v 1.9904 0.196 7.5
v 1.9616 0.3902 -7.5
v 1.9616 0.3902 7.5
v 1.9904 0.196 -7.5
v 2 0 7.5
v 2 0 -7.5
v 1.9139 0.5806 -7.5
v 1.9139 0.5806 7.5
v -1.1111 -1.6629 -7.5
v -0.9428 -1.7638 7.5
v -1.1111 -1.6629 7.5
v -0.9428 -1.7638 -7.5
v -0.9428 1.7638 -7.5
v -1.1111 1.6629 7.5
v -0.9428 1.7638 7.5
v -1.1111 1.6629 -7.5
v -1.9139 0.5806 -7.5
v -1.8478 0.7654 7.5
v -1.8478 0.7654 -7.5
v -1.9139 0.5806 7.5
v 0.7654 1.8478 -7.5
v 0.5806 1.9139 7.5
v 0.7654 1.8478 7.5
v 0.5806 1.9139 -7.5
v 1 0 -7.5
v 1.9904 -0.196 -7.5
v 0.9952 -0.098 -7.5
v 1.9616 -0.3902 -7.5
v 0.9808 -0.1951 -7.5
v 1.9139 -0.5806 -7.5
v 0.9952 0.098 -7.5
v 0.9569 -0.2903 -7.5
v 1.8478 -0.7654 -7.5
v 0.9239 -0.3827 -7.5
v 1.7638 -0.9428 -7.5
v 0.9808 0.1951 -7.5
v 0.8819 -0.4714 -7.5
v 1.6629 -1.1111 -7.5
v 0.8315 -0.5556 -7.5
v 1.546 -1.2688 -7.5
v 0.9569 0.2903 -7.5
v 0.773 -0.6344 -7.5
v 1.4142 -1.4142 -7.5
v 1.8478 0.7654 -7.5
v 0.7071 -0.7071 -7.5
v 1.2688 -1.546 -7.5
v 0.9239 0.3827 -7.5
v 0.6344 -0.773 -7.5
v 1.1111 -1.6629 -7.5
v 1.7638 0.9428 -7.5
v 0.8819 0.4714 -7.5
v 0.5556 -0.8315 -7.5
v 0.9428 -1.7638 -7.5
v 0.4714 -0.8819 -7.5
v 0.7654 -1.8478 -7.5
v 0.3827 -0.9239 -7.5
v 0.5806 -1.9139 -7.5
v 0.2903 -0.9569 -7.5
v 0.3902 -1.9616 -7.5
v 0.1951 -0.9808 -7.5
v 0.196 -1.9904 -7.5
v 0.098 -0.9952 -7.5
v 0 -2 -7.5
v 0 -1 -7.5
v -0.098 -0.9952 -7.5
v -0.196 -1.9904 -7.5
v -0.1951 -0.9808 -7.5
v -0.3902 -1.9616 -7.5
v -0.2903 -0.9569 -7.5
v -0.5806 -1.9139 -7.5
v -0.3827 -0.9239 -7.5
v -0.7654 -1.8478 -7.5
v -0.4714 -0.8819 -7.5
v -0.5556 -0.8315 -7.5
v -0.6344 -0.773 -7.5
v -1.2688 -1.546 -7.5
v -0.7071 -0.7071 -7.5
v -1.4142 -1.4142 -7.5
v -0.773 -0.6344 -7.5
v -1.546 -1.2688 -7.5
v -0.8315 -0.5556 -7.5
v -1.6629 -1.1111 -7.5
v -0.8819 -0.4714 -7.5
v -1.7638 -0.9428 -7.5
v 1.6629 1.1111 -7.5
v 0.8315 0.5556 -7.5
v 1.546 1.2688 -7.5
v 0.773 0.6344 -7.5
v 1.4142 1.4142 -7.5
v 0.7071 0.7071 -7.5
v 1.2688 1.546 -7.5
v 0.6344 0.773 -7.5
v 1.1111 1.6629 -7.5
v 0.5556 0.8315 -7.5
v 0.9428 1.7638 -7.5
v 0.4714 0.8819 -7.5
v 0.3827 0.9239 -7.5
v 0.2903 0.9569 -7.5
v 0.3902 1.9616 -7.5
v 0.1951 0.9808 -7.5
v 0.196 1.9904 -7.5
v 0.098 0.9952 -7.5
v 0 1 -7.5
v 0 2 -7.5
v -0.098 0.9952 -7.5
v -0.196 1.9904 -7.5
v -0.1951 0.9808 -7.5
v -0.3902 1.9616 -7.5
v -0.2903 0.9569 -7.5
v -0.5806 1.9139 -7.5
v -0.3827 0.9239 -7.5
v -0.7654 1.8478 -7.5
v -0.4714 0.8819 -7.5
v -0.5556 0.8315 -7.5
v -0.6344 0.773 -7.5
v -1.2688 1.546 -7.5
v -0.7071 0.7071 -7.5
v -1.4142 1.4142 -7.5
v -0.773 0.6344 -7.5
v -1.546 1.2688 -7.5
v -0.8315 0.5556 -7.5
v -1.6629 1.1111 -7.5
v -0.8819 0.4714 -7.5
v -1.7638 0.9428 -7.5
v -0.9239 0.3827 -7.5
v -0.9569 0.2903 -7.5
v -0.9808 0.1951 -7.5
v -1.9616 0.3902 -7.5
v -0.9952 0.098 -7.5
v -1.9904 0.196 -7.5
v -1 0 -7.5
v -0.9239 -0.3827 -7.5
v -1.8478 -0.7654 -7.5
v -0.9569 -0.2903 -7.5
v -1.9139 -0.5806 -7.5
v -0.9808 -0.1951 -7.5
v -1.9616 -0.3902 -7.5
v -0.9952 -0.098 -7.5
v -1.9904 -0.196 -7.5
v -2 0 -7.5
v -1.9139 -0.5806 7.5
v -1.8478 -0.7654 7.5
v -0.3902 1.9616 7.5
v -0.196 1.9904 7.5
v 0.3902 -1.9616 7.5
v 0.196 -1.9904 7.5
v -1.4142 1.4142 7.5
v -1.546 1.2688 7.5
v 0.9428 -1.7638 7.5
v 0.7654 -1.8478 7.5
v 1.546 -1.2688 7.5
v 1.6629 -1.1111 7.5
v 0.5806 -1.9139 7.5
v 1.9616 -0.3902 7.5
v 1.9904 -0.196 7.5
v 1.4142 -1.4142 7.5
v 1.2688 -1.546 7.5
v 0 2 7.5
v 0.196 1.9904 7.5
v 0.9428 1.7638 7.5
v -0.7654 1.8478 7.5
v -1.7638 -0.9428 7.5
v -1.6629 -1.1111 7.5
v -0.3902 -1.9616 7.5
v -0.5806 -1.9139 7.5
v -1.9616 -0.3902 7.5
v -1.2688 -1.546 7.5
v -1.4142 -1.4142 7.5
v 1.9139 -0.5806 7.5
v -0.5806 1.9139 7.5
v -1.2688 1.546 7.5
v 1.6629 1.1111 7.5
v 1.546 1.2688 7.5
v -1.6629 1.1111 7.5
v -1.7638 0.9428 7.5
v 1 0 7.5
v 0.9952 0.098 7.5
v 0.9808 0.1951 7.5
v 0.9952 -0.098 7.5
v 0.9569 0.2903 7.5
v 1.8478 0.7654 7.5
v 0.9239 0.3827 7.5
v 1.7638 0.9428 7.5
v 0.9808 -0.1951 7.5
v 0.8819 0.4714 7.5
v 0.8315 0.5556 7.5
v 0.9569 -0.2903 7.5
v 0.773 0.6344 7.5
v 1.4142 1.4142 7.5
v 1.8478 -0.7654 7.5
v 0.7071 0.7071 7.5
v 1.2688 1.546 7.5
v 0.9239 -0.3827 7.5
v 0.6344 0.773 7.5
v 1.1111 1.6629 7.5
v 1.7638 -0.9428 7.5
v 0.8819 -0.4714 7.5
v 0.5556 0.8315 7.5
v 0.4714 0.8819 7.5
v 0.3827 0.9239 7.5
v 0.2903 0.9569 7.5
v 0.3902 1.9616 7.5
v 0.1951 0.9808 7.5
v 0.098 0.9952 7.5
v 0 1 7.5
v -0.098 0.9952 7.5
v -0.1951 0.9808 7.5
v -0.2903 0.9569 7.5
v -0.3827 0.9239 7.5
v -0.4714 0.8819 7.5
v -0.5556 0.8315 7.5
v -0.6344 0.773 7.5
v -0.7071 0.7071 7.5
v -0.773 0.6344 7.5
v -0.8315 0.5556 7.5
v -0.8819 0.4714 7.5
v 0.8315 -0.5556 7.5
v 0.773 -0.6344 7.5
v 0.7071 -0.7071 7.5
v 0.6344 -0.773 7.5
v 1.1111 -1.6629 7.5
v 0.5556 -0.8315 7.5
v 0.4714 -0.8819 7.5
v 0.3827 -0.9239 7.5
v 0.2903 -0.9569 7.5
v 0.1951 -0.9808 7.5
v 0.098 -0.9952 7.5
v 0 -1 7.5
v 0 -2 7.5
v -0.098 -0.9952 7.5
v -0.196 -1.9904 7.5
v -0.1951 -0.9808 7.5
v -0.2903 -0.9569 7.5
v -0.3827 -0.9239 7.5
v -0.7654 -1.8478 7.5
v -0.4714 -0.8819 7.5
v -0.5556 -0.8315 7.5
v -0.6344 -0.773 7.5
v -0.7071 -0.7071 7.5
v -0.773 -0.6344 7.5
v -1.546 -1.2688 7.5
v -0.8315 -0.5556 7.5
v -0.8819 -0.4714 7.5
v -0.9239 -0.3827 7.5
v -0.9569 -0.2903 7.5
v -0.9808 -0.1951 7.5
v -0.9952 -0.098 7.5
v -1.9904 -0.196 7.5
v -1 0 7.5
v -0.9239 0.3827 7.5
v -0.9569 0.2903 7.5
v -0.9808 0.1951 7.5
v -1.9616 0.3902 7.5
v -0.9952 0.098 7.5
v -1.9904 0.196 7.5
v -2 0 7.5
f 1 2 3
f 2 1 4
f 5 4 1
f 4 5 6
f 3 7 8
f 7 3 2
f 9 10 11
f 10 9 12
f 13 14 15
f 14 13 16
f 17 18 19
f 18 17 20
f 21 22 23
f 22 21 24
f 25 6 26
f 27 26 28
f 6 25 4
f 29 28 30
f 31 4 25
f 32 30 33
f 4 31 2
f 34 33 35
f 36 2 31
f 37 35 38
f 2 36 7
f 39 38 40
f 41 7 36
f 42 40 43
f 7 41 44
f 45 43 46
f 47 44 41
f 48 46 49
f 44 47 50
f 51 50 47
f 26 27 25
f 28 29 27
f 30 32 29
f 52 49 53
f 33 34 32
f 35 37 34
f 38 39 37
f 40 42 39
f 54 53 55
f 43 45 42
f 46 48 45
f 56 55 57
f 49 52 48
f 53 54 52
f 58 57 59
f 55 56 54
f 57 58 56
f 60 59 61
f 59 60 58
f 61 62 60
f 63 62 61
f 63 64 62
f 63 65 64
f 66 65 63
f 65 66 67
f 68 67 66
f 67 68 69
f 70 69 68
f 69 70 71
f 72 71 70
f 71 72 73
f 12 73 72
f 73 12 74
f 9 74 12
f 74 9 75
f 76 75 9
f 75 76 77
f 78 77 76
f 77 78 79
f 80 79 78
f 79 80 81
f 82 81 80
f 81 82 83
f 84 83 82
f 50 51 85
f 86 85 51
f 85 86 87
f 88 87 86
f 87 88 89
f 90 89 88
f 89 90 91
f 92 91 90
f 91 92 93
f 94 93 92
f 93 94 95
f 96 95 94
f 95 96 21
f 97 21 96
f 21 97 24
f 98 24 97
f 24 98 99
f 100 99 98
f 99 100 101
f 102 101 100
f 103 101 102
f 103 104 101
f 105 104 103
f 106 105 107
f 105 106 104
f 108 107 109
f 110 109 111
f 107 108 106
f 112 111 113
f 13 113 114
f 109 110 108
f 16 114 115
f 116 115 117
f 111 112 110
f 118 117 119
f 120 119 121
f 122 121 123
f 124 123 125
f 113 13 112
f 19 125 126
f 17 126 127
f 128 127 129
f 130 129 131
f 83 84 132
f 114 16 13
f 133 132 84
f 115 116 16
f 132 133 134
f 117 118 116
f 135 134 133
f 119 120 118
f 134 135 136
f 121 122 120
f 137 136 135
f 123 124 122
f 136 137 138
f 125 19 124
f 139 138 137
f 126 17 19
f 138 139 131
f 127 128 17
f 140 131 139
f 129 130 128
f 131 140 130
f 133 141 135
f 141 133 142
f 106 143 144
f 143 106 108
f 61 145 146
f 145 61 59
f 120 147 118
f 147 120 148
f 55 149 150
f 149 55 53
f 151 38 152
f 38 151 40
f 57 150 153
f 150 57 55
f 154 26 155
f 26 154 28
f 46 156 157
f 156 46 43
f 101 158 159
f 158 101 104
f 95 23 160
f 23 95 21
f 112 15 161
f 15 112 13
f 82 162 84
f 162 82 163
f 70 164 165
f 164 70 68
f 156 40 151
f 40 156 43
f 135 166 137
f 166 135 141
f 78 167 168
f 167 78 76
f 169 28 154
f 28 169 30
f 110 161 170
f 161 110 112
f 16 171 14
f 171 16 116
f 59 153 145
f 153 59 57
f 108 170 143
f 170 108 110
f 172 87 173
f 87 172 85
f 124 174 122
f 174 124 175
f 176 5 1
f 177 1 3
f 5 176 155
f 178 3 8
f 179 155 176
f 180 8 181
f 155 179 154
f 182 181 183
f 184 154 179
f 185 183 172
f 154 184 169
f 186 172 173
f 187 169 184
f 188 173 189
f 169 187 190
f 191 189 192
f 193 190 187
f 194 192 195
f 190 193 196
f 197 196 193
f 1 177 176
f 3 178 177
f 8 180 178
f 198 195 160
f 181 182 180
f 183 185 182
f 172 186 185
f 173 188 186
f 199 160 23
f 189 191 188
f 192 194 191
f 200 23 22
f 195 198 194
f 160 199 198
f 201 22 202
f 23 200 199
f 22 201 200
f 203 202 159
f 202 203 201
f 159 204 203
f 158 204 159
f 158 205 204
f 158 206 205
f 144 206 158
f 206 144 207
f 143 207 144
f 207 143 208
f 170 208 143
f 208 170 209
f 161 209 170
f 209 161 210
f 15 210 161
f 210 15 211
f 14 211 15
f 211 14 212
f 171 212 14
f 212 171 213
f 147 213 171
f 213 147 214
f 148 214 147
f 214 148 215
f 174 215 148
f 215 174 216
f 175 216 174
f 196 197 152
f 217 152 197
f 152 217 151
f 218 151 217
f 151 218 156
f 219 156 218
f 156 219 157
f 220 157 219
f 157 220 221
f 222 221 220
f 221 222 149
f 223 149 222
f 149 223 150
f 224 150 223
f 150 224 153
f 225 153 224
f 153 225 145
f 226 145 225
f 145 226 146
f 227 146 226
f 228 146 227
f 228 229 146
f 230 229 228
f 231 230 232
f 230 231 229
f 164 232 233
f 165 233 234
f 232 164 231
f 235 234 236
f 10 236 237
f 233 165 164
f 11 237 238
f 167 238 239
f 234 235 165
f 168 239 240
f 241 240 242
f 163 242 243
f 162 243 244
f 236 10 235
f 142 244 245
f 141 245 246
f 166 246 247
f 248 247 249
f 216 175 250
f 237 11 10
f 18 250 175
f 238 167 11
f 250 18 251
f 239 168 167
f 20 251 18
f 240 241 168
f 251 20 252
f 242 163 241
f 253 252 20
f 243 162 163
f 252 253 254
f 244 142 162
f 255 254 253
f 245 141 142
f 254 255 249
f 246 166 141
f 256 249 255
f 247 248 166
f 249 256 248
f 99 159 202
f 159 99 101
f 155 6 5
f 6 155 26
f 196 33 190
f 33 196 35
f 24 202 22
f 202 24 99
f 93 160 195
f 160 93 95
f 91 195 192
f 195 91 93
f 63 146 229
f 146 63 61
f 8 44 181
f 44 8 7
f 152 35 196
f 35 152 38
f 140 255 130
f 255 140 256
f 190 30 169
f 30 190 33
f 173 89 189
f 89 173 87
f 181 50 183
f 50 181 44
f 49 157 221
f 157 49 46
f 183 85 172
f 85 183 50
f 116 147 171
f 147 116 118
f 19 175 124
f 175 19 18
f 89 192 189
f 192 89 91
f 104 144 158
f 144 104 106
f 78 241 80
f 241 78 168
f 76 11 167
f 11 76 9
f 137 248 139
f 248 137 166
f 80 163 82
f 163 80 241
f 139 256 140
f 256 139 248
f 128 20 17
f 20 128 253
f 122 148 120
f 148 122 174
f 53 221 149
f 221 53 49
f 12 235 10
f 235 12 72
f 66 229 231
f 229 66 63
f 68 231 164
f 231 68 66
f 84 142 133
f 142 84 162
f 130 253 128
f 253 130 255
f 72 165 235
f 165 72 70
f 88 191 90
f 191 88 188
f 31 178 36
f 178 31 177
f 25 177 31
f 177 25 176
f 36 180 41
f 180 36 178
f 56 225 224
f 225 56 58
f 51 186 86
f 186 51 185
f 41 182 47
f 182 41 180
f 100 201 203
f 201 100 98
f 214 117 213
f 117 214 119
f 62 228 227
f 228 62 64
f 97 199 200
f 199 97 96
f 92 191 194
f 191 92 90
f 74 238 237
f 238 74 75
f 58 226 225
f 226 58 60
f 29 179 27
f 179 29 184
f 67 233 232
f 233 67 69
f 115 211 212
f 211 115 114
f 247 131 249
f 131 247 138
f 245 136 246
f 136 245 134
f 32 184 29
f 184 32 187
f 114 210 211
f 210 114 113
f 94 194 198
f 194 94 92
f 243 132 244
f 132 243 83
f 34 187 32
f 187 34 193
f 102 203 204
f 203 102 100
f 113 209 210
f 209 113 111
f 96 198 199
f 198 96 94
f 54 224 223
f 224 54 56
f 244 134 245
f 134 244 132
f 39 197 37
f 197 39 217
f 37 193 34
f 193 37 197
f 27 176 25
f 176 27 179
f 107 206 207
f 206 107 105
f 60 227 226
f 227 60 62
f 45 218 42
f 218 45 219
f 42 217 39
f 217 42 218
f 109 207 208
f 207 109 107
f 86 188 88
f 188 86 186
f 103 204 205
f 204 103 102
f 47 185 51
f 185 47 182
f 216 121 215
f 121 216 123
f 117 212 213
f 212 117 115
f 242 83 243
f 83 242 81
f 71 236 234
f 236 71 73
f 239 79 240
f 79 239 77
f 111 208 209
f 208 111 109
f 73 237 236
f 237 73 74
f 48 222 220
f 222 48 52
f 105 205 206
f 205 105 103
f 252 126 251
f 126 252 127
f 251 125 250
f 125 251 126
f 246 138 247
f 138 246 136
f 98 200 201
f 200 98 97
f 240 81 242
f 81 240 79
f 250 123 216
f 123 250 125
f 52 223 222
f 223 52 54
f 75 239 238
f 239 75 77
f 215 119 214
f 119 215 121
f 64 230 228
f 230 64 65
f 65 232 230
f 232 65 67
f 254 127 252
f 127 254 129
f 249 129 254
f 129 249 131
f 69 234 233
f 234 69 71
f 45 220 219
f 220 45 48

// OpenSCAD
// Parameters
length = 15; //[8:30:1]
forced_id = 0; //[0:10:0.1]
center = 1; //[0:1:1]
default_id = 2; //[1:4:0.1]
default_od = 4; //[2:8:0.1]
id = forced_id > 0 ? forced_id : default_id; //[1:10:0.1]
od = default_od; //[2:12:0.1]
overlap = 1; //[0.5:2:0.1]
z_center_offset = center ? 0 : length / 2; //[-50:50:0.1]

// Tubing - complete geometry
module tubing() {
  color([0.85, 0.85, 0.8]) { // Off-white for PTFE
    difference() {
      // Outer tube
      translate([0, 0, z_center_offset])
        cylinder(h=length, r=od/2, center=true, $fn=64);
      // Inner bore
      translate([0, 0, z_center_offset])
        cylinder(h=length + 2*overlap, r=id/2, center=true, $fn=64);
    }
  }
}

// Assembly
module assembly() {
  tubing();
}

assembly();
